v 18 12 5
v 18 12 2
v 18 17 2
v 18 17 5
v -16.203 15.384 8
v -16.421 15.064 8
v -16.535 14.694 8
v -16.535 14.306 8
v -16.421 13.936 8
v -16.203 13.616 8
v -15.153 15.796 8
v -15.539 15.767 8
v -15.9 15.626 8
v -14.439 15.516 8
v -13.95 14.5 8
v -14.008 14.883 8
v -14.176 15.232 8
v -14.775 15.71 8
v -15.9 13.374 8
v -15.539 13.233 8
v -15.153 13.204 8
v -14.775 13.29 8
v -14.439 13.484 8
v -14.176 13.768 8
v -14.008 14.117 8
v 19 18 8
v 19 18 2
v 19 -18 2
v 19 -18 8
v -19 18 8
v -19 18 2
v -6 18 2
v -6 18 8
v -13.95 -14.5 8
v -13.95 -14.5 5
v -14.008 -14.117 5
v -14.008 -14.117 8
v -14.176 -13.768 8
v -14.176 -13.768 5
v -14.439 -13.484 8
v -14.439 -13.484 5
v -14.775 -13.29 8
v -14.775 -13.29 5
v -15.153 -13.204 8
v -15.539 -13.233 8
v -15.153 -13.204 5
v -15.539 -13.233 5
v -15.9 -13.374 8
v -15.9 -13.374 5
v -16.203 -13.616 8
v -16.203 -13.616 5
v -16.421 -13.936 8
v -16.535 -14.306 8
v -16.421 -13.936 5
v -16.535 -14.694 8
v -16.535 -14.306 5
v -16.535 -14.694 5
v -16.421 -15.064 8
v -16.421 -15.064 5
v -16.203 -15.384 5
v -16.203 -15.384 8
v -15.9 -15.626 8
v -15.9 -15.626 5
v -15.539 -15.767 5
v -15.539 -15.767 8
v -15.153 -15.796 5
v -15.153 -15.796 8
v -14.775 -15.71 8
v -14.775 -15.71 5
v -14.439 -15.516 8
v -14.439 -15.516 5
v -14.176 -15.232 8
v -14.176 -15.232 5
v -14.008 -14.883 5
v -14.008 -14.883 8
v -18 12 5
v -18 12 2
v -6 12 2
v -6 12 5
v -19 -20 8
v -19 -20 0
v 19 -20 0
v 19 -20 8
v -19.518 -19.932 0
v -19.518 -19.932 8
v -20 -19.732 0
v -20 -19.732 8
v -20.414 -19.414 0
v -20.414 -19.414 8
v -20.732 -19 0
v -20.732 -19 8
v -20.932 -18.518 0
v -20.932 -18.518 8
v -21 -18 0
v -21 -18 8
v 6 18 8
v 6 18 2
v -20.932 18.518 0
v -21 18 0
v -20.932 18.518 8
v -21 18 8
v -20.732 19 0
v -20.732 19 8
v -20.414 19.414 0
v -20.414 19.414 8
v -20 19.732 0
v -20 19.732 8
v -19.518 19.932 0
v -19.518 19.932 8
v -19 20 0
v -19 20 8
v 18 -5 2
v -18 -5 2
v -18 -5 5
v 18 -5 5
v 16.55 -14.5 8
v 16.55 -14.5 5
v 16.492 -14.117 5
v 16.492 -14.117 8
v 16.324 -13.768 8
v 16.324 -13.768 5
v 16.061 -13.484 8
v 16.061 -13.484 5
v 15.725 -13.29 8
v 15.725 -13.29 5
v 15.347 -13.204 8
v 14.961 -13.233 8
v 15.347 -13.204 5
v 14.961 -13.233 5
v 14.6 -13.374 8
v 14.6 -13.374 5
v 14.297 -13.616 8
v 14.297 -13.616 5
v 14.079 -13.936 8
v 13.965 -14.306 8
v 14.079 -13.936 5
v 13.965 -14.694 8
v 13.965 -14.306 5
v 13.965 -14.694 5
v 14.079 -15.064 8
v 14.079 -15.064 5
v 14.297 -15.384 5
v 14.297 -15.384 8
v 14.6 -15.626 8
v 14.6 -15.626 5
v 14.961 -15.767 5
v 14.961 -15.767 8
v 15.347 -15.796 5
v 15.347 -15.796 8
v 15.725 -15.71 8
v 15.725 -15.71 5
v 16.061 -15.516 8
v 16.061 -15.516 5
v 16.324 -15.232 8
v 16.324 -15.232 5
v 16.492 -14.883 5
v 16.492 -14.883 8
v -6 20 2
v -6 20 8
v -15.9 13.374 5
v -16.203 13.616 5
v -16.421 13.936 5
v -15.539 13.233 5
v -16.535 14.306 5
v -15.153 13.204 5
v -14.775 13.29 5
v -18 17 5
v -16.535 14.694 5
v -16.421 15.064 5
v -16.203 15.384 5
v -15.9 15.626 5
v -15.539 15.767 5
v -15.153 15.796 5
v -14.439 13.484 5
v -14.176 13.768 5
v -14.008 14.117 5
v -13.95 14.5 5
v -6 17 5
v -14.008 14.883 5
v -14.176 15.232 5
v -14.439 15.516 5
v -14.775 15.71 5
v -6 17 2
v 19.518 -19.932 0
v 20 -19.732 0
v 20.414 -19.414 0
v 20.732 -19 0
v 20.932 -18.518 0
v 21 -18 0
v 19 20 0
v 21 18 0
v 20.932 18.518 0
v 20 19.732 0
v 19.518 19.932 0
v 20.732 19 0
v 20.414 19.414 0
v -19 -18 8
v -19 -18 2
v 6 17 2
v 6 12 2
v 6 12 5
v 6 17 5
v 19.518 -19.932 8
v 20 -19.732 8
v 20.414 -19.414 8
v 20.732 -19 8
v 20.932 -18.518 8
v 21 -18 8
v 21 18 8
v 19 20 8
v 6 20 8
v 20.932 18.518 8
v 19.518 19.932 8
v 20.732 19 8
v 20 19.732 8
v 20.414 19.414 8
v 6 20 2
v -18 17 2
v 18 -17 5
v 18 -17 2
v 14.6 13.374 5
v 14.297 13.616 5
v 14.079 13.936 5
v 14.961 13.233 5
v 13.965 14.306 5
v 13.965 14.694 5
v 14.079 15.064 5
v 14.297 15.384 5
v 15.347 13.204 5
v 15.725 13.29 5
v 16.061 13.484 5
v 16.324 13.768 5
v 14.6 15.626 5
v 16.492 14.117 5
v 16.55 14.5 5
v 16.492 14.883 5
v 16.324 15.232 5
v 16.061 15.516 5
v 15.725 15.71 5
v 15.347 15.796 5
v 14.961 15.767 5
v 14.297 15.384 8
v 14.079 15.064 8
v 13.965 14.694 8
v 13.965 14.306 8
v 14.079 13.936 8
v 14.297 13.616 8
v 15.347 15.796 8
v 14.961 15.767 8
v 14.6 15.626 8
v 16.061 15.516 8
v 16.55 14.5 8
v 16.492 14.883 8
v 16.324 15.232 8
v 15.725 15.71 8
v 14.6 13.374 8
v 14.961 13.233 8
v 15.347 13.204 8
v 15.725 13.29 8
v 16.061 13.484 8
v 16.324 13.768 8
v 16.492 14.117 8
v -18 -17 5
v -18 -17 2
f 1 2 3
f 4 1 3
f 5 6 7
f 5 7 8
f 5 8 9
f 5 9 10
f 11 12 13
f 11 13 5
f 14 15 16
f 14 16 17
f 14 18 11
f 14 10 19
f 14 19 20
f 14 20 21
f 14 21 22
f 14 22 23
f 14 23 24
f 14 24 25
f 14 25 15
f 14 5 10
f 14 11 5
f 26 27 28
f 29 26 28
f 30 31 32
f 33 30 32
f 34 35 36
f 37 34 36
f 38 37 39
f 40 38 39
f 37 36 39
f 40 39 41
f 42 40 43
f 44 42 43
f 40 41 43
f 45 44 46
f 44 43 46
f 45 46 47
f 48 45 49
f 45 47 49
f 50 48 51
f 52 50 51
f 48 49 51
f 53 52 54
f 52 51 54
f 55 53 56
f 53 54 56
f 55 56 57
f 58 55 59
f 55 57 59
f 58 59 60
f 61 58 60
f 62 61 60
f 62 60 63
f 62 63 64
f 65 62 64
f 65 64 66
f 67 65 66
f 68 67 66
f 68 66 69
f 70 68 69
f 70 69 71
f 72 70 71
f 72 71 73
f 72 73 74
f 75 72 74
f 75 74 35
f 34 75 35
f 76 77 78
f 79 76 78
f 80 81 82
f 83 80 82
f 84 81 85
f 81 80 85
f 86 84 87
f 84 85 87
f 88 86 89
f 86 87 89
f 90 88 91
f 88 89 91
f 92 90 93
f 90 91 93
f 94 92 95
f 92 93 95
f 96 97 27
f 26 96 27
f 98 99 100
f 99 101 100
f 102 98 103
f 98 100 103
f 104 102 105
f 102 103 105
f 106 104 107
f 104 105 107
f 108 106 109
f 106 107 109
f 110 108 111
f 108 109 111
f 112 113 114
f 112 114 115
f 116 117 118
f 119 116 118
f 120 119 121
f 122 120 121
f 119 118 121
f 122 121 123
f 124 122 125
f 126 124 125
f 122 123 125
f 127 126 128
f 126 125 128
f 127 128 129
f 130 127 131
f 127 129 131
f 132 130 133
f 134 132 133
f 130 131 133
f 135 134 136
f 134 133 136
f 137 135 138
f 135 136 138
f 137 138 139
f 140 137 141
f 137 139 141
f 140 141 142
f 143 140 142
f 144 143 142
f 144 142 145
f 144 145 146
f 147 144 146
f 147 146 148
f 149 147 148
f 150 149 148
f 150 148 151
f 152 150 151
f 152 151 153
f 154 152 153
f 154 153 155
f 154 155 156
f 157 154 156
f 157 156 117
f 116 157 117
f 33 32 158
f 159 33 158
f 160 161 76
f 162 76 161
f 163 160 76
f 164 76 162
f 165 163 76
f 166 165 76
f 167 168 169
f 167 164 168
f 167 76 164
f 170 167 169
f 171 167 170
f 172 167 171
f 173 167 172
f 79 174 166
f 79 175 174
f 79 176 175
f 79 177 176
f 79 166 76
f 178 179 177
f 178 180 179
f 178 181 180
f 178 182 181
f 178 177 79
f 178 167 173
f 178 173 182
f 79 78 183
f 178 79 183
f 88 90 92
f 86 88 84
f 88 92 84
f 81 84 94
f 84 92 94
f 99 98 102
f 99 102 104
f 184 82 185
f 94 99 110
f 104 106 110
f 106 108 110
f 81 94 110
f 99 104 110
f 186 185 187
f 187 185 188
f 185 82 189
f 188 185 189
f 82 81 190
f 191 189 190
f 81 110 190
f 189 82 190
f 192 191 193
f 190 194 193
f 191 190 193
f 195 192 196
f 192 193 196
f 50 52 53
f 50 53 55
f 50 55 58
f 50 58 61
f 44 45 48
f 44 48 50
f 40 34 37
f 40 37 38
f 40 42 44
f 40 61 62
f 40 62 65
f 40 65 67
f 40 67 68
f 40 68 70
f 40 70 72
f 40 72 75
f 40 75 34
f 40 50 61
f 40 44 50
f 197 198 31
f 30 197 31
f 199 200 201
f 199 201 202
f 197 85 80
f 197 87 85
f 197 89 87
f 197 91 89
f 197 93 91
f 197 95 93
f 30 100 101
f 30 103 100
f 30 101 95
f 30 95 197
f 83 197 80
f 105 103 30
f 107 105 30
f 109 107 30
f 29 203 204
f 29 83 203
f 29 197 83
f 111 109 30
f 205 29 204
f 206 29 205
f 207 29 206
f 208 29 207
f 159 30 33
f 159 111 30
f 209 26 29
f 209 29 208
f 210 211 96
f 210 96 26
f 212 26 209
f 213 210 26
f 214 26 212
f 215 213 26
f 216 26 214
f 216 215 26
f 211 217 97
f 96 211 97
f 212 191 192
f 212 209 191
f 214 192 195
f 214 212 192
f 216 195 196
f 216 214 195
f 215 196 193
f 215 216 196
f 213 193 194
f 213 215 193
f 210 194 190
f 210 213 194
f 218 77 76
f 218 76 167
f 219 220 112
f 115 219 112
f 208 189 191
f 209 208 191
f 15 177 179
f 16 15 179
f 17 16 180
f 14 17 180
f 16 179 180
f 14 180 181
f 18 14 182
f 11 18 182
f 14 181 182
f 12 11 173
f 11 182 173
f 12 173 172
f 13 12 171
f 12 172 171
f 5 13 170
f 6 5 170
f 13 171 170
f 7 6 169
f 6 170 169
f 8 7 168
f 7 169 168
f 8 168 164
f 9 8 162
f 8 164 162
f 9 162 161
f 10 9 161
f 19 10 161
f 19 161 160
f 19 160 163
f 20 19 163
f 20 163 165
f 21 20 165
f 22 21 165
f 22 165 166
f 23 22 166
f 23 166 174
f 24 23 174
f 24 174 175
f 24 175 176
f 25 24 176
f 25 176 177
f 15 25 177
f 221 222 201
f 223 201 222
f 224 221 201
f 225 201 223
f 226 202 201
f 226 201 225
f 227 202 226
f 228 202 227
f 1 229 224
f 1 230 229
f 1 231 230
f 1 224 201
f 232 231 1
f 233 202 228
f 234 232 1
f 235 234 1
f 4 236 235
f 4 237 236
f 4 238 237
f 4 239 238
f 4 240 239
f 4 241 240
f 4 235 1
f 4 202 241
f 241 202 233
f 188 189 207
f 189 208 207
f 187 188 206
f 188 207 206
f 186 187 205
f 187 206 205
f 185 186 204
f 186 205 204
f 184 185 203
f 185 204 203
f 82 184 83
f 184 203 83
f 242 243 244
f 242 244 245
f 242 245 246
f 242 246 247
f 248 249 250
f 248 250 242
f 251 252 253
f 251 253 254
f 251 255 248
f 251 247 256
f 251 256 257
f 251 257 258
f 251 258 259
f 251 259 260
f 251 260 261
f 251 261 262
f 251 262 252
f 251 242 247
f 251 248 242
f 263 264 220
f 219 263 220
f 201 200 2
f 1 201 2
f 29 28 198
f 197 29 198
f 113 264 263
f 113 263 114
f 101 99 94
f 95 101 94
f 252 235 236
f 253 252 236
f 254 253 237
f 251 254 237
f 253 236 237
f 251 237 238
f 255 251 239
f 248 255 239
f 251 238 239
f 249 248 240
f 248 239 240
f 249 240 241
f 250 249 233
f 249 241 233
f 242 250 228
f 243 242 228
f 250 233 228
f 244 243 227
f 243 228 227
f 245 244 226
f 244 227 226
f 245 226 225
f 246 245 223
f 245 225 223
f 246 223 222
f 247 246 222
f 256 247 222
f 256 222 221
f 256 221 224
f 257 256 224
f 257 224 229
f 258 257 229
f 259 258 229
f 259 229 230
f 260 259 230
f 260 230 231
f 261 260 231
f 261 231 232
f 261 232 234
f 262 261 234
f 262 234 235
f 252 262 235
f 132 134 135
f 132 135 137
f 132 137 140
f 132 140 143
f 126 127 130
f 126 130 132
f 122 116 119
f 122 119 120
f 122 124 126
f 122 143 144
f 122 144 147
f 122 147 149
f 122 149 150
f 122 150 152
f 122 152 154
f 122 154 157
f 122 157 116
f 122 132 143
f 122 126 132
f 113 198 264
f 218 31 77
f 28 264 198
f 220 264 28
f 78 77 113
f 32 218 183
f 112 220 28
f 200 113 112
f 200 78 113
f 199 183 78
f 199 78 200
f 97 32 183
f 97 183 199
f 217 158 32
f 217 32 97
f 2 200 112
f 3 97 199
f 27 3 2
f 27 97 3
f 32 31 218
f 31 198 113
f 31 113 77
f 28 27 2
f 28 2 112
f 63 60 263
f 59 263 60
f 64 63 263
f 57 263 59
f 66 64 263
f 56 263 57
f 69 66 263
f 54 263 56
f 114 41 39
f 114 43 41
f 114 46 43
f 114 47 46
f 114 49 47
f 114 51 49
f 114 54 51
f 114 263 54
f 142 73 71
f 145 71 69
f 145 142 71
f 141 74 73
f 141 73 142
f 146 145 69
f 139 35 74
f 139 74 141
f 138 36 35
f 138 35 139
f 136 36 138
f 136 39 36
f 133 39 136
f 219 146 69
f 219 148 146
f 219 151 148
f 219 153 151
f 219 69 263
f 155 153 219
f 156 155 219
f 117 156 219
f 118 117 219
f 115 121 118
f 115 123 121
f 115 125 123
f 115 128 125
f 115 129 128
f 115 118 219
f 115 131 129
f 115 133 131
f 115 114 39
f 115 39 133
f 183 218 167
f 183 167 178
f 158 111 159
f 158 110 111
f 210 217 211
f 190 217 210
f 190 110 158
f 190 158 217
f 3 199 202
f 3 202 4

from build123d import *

# Parameters (mm, degrees)
F0_W     = 36
F0_H     = 12
F0_R     = 1.3
F1_DEPTH = 5
F0_W_2   = 12
F0_H_2   = 5
F0_H_3   = 1
F0_H_4   = 2
F2_DEPTH = 2
F3_DEPTH = 8
F4_R     = 2


with BuildPart() as f1:
    # F0 (on Top) → F1 (new body)
    with BuildSketch(Plane.XY):
        with Locations((0, -11)):
            Rectangle(F0_W, F0_H)
        with Locations((-15.25, -14.5)):
            Circle(F0_R, mode=Mode.SUBTRACT)
        with Locations((15.25, -14.5)):
            Circle(F0_R, mode=Mode.SUBTRACT)
    extrude(amount=F1_DEPTH)



with BuildPart() as f1b:
    # F0 (on Top) → F1, piece 2 (new body)
    with BuildSketch(Plane.XY):
        with Locations((-12, 14.5)):
            Rectangle(F0_W_2, F0_H_2)
        with Locations((-15.25, 14.5)):
            Circle(F0_R, mode=Mode.SUBTRACT)
    extrude(amount=F1_DEPTH)


with BuildPart() as f1c:
    # F0 (on Top) → F1, piece 3 (new body)
    with BuildSketch(Plane.XY):
        with Locations((12, 14.5)):
            Rectangle(F0_W_2, F0_H_2)
        with Locations((15.25, 14.5)):
            Circle(F0_R, mode=Mode.SUBTRACT)
    extrude(amount=F1_DEPTH)


with BuildPart() as f1_1:
    add(f1.part)

    add(f1b.part)  # F2 merges F1b

    add(f1c.part)  # F2 merges F1c
    # F0 (on Top) → F2 (join)
    with BuildSketch(Plane.XY):
        Polygon((-6, 12), (-18, 12), (-18, -5), (18, -5), (18, 12), (6, 12), align=None)
        with Locations((0, 14.5)):
            Rectangle(F0_W_2, F0_H_2)
        Polygon((-18, 12), (-18, 17), (-6, 17), (-6, 18), (-19, 18), (-19, -18), (19, -18), (19, 18), (6, 18), (6, 17), (18, 17), (18, 12), (18, -5), (18, -17), (-18, -17), (-18, -5), align=None)
        with Locations((0, 17.5)):
            Rectangle(F0_W_2, F0_H_3)
        with Locations((0, 19)):
            Rectangle(F0_W_2, F0_H_4)
    extrude(amount=F2_DEPTH)

    # F0 (on Top) → F3 (join)
    with BuildSketch(Plane.XY):
        with Locations((-15.25, 14.5)):
            Circle(F0_R)
        with Locations((15.25, 14.5)):
            Circle(F0_R)
        with Locations((15.25, -14.5)):
            Circle(F0_R)
        with Locations((-15.25, -14.5)):
            Circle(F0_R)
        Polygon((-19, 18), (-6, 18), (-6, 20), (-21, 20), (-21, -20), (21, -20), (21, 20), (6, 20), (6, 18), (19, 18), (19, -18), (-19, -18), align=None)
    extrude(amount=F3_DEPTH)

    # F4
    f4_edges = [f1_1.edges().sort_by_distance(p)[0] for p in [
        (-21, -20, 4),
        (21, -20, 4),
        (21, 20, 4),
        (-21, 20, 4),
    ]]
    fillet(f4_edges, radius=F4_R)


solid = f1_1.part
